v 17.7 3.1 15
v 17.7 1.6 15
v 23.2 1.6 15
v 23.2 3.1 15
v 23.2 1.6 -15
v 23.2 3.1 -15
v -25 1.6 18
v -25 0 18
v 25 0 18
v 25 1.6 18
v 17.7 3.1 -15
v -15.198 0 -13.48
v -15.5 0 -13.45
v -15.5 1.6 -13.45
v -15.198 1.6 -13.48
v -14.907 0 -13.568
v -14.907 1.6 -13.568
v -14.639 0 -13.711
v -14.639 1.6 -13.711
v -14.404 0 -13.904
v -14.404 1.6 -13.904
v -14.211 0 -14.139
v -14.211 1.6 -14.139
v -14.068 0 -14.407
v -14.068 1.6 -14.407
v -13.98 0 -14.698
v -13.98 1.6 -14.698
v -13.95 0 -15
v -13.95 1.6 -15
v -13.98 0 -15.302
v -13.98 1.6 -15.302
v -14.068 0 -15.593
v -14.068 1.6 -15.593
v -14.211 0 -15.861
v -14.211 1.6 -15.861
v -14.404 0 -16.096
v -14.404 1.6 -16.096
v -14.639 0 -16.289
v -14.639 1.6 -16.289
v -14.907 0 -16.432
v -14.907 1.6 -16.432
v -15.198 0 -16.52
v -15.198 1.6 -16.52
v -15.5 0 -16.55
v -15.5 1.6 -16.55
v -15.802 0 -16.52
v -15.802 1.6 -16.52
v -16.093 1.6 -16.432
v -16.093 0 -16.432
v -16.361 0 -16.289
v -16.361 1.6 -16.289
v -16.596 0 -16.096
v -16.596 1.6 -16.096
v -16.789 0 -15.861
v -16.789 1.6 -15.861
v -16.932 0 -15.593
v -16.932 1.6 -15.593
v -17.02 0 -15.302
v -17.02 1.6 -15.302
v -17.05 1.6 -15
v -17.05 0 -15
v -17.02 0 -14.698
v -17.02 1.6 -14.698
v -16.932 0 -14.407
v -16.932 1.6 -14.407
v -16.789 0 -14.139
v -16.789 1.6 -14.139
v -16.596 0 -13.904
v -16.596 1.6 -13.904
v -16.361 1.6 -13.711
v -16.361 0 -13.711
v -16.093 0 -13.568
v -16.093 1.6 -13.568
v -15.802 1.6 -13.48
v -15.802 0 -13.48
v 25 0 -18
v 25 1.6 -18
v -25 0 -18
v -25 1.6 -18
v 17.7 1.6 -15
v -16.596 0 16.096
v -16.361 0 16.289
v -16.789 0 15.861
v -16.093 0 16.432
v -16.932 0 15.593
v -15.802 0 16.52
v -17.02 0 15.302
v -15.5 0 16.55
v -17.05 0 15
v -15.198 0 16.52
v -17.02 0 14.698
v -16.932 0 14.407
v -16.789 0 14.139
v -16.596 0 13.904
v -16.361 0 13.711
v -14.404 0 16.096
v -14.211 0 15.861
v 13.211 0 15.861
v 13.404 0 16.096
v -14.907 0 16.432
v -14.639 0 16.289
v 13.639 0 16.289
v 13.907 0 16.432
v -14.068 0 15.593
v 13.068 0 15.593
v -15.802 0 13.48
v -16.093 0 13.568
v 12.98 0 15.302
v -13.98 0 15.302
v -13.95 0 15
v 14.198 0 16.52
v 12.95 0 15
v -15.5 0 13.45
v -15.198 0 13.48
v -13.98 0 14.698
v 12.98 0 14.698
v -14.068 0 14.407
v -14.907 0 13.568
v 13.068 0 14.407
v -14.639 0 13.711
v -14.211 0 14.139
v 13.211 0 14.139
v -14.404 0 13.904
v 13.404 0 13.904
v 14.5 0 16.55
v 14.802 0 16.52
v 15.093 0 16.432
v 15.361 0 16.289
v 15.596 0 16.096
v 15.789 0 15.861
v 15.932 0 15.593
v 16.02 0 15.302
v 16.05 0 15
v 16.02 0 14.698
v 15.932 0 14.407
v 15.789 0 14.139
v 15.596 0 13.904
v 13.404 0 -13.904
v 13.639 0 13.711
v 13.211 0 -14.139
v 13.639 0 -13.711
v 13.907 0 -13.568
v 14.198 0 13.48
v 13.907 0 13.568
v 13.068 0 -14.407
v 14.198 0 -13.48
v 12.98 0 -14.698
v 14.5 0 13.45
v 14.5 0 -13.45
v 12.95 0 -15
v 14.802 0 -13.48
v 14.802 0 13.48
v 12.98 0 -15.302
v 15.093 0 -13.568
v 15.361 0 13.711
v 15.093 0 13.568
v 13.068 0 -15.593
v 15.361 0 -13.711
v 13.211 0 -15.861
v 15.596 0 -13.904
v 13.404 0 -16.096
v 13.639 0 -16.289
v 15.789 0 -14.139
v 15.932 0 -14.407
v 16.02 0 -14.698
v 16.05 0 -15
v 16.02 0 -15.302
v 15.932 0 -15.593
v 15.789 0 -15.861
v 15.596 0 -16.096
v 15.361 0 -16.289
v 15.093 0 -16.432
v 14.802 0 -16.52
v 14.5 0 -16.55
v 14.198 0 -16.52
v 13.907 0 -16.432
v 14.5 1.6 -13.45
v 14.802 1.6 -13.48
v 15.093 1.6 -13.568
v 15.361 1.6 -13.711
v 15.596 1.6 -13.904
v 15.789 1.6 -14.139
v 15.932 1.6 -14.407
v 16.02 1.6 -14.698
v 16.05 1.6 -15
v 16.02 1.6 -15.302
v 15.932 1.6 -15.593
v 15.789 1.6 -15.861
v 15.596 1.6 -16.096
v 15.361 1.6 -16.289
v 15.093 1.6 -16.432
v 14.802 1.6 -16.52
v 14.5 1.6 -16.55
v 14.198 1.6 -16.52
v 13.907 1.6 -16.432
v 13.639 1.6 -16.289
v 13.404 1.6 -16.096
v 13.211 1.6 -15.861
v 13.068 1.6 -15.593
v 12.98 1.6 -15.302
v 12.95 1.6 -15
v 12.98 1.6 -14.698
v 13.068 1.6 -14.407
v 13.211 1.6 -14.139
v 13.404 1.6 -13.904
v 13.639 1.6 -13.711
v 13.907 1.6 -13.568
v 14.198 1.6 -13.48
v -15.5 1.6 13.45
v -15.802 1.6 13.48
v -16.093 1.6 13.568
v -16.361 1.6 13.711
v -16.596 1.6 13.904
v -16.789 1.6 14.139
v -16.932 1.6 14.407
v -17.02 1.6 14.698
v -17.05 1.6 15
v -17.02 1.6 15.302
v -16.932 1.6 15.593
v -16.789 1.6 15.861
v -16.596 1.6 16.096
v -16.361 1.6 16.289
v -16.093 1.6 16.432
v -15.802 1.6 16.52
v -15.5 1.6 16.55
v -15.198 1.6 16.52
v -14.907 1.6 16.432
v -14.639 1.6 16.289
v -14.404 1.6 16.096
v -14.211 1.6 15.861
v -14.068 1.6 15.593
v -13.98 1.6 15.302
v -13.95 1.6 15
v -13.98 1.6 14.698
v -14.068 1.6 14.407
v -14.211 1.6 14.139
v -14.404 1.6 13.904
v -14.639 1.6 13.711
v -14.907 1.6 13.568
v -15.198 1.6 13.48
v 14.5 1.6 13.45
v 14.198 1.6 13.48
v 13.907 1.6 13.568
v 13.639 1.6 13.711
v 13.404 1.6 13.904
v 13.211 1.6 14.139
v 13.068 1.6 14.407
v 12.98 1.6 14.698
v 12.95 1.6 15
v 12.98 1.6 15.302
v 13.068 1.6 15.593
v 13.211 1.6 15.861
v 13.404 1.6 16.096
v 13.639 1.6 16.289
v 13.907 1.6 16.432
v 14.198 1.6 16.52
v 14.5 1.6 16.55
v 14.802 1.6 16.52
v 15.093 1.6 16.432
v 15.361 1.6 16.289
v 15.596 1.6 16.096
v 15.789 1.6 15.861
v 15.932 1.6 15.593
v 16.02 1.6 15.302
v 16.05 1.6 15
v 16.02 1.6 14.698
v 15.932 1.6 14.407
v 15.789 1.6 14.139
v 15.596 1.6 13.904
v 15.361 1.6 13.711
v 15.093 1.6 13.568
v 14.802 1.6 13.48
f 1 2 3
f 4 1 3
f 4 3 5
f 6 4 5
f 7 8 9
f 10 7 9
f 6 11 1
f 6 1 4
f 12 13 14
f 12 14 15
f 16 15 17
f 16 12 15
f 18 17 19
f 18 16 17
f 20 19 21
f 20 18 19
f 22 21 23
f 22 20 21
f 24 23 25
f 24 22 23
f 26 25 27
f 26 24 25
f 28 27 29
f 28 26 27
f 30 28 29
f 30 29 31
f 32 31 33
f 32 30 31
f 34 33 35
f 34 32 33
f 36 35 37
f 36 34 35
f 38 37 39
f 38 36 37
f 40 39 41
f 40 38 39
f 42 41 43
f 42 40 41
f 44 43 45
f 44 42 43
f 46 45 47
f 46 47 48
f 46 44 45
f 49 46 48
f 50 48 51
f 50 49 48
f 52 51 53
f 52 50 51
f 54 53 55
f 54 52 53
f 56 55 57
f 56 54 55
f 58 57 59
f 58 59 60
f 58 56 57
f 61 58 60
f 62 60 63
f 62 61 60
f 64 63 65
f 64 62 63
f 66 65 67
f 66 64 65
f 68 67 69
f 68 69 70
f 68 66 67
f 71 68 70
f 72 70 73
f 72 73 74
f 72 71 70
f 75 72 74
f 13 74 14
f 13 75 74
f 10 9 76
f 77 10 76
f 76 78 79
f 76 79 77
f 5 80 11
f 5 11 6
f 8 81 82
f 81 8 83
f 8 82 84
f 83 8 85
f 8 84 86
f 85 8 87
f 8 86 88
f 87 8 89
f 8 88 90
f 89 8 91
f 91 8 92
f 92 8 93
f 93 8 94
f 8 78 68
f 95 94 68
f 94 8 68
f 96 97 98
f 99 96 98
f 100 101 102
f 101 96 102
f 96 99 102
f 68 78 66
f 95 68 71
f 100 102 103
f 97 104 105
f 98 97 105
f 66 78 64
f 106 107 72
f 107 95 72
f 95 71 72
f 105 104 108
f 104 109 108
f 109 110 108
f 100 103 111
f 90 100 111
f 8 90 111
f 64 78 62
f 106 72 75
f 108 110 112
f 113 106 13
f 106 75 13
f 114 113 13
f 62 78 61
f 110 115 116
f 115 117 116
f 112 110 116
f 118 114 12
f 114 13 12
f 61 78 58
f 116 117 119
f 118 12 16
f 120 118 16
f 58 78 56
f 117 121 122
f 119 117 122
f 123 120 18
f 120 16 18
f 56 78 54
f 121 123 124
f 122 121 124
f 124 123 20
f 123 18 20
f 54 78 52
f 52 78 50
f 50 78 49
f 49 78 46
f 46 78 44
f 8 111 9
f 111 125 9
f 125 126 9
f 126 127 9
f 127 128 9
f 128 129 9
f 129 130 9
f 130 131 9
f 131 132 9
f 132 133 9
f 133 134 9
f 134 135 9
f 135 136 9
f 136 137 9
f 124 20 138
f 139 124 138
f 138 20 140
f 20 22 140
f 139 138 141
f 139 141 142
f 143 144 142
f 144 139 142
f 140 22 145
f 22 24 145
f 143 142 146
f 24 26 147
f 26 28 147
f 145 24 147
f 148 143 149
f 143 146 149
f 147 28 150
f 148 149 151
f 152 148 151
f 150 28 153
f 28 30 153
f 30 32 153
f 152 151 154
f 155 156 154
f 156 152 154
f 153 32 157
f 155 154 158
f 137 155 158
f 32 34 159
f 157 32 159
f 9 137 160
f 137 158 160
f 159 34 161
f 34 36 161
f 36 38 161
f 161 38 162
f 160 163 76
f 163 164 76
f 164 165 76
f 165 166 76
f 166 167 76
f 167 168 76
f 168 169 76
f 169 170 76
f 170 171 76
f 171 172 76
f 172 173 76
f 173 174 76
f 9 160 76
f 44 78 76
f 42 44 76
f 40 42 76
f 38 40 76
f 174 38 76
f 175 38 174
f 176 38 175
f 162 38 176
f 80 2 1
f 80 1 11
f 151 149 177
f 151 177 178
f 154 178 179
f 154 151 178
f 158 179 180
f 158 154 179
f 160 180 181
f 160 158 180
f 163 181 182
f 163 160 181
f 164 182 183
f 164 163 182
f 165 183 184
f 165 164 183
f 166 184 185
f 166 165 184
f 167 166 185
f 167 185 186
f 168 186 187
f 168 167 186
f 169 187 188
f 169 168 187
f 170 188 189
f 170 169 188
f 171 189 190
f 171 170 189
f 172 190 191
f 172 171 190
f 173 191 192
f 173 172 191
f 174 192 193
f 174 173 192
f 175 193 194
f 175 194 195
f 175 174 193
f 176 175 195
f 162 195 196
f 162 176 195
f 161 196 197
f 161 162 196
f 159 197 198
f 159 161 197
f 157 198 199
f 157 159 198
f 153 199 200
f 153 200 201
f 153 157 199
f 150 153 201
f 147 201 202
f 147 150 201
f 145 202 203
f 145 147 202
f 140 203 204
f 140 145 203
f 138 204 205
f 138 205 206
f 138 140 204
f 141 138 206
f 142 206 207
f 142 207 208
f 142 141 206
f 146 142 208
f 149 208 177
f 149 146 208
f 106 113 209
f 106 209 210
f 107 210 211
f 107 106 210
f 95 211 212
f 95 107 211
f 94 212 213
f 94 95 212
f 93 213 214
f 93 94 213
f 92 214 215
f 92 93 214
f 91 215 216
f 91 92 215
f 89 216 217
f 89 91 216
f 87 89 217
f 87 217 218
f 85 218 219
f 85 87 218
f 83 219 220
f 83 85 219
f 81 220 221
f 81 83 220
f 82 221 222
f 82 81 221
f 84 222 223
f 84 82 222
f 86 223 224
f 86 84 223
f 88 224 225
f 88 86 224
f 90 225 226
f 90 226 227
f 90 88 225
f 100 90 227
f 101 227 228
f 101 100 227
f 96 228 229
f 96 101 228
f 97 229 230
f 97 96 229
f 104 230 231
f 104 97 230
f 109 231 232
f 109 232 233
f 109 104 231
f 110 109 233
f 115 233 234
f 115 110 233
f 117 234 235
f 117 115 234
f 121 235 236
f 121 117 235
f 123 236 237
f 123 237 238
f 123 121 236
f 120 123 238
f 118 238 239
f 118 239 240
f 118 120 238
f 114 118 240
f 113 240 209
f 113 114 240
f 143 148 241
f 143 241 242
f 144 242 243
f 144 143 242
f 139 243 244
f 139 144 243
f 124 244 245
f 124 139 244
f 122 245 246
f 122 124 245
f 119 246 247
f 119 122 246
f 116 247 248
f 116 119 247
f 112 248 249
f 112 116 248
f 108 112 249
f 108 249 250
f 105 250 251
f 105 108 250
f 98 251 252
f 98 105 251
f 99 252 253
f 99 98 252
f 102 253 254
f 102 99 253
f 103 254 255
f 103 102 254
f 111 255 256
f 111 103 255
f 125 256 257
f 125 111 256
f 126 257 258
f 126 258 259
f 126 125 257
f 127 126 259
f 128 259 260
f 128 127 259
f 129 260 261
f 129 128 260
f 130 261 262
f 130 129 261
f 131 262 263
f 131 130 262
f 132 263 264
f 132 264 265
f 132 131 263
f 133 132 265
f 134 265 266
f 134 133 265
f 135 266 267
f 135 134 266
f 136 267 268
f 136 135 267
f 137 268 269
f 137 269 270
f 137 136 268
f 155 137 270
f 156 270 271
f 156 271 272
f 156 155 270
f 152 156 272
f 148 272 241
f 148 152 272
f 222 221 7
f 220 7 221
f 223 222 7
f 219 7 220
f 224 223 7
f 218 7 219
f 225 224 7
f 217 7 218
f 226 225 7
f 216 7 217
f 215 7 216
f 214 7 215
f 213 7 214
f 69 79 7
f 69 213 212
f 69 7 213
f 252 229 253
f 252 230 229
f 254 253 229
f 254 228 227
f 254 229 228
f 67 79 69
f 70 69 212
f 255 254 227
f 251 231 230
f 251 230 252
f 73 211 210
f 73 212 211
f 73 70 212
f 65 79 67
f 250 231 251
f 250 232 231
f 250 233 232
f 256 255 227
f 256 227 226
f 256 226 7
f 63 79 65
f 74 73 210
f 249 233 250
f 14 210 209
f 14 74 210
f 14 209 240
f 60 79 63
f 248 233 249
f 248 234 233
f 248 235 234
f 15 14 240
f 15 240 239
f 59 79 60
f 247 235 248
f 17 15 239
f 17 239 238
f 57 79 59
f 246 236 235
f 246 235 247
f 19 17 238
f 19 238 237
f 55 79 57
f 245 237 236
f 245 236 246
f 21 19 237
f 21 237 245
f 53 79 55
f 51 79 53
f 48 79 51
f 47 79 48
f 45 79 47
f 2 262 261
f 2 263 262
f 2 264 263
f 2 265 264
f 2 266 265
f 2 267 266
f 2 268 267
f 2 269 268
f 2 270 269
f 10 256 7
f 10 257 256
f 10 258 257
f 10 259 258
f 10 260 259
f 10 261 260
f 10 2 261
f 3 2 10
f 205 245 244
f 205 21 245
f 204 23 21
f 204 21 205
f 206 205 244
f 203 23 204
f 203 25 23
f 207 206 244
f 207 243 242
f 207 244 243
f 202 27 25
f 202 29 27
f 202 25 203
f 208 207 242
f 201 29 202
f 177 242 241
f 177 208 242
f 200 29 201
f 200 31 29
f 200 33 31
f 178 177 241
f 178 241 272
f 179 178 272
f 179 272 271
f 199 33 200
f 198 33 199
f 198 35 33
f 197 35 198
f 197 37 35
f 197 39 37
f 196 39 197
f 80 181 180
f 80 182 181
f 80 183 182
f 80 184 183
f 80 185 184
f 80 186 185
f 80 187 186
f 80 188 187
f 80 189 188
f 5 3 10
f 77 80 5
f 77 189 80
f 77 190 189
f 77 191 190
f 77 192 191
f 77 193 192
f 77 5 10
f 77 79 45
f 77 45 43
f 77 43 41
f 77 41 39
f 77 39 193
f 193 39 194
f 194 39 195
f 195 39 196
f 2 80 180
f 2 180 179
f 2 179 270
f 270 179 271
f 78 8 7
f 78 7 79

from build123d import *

# Parameters (mm, degrees)
SKETCH1_W           = 50
SKETCH1_H           = 36
SKETCH1_R           = 1.55
BOSS_EXTRUDE1_DEPTH = 1.6
SKETCH2_W           = 5.5
SKETCH2_H           = 30
BOSS_EXTRUDE2_DEPTH = 1.5


with BuildPart() as part:
    # Sketch1 → Boss-Extrude1 (new body)
    with BuildSketch(Plane(origin=(0, 0, 0), x_dir=(1, 0, 0), z_dir=(0, 1, 0))):
        Rectangle(SKETCH1_W, SKETCH1_H)
        with Locations(Location((-15.5, 15, 0), (0, 0, 270))):
            Circle(SKETCH1_R, mode=Mode.SUBTRACT)
        with Locations(Location((-15.5, -15, 0), (0, 0, 90))):
            Circle(SKETCH1_R, mode=Mode.SUBTRACT)
        with Locations(Location((14.5, 15, 0), (0, 0, 270))):
            Circle(SKETCH1_R, mode=Mode.SUBTRACT)
        with Locations(Location((14.5, -15, 0), (0, 0, 90))):
            Circle(SKETCH1_R, mode=Mode.SUBTRACT)
    extrude(amount=BOSS_EXTRUDE1_DEPTH)

    # Sketch2 → Boss-Extrude2 (add)
    with BuildSketch(Plane(origin=(0, 1.6, 0), x_dir=(1, 0, 0), z_dir=(0, 1, 0))):
        with Locations((20.45, 0)):
            Rectangle(SKETCH2_W, SKETCH2_H)
    extrude(amount=BOSS_EXTRUDE2_DEPTH)


solid = part.part
